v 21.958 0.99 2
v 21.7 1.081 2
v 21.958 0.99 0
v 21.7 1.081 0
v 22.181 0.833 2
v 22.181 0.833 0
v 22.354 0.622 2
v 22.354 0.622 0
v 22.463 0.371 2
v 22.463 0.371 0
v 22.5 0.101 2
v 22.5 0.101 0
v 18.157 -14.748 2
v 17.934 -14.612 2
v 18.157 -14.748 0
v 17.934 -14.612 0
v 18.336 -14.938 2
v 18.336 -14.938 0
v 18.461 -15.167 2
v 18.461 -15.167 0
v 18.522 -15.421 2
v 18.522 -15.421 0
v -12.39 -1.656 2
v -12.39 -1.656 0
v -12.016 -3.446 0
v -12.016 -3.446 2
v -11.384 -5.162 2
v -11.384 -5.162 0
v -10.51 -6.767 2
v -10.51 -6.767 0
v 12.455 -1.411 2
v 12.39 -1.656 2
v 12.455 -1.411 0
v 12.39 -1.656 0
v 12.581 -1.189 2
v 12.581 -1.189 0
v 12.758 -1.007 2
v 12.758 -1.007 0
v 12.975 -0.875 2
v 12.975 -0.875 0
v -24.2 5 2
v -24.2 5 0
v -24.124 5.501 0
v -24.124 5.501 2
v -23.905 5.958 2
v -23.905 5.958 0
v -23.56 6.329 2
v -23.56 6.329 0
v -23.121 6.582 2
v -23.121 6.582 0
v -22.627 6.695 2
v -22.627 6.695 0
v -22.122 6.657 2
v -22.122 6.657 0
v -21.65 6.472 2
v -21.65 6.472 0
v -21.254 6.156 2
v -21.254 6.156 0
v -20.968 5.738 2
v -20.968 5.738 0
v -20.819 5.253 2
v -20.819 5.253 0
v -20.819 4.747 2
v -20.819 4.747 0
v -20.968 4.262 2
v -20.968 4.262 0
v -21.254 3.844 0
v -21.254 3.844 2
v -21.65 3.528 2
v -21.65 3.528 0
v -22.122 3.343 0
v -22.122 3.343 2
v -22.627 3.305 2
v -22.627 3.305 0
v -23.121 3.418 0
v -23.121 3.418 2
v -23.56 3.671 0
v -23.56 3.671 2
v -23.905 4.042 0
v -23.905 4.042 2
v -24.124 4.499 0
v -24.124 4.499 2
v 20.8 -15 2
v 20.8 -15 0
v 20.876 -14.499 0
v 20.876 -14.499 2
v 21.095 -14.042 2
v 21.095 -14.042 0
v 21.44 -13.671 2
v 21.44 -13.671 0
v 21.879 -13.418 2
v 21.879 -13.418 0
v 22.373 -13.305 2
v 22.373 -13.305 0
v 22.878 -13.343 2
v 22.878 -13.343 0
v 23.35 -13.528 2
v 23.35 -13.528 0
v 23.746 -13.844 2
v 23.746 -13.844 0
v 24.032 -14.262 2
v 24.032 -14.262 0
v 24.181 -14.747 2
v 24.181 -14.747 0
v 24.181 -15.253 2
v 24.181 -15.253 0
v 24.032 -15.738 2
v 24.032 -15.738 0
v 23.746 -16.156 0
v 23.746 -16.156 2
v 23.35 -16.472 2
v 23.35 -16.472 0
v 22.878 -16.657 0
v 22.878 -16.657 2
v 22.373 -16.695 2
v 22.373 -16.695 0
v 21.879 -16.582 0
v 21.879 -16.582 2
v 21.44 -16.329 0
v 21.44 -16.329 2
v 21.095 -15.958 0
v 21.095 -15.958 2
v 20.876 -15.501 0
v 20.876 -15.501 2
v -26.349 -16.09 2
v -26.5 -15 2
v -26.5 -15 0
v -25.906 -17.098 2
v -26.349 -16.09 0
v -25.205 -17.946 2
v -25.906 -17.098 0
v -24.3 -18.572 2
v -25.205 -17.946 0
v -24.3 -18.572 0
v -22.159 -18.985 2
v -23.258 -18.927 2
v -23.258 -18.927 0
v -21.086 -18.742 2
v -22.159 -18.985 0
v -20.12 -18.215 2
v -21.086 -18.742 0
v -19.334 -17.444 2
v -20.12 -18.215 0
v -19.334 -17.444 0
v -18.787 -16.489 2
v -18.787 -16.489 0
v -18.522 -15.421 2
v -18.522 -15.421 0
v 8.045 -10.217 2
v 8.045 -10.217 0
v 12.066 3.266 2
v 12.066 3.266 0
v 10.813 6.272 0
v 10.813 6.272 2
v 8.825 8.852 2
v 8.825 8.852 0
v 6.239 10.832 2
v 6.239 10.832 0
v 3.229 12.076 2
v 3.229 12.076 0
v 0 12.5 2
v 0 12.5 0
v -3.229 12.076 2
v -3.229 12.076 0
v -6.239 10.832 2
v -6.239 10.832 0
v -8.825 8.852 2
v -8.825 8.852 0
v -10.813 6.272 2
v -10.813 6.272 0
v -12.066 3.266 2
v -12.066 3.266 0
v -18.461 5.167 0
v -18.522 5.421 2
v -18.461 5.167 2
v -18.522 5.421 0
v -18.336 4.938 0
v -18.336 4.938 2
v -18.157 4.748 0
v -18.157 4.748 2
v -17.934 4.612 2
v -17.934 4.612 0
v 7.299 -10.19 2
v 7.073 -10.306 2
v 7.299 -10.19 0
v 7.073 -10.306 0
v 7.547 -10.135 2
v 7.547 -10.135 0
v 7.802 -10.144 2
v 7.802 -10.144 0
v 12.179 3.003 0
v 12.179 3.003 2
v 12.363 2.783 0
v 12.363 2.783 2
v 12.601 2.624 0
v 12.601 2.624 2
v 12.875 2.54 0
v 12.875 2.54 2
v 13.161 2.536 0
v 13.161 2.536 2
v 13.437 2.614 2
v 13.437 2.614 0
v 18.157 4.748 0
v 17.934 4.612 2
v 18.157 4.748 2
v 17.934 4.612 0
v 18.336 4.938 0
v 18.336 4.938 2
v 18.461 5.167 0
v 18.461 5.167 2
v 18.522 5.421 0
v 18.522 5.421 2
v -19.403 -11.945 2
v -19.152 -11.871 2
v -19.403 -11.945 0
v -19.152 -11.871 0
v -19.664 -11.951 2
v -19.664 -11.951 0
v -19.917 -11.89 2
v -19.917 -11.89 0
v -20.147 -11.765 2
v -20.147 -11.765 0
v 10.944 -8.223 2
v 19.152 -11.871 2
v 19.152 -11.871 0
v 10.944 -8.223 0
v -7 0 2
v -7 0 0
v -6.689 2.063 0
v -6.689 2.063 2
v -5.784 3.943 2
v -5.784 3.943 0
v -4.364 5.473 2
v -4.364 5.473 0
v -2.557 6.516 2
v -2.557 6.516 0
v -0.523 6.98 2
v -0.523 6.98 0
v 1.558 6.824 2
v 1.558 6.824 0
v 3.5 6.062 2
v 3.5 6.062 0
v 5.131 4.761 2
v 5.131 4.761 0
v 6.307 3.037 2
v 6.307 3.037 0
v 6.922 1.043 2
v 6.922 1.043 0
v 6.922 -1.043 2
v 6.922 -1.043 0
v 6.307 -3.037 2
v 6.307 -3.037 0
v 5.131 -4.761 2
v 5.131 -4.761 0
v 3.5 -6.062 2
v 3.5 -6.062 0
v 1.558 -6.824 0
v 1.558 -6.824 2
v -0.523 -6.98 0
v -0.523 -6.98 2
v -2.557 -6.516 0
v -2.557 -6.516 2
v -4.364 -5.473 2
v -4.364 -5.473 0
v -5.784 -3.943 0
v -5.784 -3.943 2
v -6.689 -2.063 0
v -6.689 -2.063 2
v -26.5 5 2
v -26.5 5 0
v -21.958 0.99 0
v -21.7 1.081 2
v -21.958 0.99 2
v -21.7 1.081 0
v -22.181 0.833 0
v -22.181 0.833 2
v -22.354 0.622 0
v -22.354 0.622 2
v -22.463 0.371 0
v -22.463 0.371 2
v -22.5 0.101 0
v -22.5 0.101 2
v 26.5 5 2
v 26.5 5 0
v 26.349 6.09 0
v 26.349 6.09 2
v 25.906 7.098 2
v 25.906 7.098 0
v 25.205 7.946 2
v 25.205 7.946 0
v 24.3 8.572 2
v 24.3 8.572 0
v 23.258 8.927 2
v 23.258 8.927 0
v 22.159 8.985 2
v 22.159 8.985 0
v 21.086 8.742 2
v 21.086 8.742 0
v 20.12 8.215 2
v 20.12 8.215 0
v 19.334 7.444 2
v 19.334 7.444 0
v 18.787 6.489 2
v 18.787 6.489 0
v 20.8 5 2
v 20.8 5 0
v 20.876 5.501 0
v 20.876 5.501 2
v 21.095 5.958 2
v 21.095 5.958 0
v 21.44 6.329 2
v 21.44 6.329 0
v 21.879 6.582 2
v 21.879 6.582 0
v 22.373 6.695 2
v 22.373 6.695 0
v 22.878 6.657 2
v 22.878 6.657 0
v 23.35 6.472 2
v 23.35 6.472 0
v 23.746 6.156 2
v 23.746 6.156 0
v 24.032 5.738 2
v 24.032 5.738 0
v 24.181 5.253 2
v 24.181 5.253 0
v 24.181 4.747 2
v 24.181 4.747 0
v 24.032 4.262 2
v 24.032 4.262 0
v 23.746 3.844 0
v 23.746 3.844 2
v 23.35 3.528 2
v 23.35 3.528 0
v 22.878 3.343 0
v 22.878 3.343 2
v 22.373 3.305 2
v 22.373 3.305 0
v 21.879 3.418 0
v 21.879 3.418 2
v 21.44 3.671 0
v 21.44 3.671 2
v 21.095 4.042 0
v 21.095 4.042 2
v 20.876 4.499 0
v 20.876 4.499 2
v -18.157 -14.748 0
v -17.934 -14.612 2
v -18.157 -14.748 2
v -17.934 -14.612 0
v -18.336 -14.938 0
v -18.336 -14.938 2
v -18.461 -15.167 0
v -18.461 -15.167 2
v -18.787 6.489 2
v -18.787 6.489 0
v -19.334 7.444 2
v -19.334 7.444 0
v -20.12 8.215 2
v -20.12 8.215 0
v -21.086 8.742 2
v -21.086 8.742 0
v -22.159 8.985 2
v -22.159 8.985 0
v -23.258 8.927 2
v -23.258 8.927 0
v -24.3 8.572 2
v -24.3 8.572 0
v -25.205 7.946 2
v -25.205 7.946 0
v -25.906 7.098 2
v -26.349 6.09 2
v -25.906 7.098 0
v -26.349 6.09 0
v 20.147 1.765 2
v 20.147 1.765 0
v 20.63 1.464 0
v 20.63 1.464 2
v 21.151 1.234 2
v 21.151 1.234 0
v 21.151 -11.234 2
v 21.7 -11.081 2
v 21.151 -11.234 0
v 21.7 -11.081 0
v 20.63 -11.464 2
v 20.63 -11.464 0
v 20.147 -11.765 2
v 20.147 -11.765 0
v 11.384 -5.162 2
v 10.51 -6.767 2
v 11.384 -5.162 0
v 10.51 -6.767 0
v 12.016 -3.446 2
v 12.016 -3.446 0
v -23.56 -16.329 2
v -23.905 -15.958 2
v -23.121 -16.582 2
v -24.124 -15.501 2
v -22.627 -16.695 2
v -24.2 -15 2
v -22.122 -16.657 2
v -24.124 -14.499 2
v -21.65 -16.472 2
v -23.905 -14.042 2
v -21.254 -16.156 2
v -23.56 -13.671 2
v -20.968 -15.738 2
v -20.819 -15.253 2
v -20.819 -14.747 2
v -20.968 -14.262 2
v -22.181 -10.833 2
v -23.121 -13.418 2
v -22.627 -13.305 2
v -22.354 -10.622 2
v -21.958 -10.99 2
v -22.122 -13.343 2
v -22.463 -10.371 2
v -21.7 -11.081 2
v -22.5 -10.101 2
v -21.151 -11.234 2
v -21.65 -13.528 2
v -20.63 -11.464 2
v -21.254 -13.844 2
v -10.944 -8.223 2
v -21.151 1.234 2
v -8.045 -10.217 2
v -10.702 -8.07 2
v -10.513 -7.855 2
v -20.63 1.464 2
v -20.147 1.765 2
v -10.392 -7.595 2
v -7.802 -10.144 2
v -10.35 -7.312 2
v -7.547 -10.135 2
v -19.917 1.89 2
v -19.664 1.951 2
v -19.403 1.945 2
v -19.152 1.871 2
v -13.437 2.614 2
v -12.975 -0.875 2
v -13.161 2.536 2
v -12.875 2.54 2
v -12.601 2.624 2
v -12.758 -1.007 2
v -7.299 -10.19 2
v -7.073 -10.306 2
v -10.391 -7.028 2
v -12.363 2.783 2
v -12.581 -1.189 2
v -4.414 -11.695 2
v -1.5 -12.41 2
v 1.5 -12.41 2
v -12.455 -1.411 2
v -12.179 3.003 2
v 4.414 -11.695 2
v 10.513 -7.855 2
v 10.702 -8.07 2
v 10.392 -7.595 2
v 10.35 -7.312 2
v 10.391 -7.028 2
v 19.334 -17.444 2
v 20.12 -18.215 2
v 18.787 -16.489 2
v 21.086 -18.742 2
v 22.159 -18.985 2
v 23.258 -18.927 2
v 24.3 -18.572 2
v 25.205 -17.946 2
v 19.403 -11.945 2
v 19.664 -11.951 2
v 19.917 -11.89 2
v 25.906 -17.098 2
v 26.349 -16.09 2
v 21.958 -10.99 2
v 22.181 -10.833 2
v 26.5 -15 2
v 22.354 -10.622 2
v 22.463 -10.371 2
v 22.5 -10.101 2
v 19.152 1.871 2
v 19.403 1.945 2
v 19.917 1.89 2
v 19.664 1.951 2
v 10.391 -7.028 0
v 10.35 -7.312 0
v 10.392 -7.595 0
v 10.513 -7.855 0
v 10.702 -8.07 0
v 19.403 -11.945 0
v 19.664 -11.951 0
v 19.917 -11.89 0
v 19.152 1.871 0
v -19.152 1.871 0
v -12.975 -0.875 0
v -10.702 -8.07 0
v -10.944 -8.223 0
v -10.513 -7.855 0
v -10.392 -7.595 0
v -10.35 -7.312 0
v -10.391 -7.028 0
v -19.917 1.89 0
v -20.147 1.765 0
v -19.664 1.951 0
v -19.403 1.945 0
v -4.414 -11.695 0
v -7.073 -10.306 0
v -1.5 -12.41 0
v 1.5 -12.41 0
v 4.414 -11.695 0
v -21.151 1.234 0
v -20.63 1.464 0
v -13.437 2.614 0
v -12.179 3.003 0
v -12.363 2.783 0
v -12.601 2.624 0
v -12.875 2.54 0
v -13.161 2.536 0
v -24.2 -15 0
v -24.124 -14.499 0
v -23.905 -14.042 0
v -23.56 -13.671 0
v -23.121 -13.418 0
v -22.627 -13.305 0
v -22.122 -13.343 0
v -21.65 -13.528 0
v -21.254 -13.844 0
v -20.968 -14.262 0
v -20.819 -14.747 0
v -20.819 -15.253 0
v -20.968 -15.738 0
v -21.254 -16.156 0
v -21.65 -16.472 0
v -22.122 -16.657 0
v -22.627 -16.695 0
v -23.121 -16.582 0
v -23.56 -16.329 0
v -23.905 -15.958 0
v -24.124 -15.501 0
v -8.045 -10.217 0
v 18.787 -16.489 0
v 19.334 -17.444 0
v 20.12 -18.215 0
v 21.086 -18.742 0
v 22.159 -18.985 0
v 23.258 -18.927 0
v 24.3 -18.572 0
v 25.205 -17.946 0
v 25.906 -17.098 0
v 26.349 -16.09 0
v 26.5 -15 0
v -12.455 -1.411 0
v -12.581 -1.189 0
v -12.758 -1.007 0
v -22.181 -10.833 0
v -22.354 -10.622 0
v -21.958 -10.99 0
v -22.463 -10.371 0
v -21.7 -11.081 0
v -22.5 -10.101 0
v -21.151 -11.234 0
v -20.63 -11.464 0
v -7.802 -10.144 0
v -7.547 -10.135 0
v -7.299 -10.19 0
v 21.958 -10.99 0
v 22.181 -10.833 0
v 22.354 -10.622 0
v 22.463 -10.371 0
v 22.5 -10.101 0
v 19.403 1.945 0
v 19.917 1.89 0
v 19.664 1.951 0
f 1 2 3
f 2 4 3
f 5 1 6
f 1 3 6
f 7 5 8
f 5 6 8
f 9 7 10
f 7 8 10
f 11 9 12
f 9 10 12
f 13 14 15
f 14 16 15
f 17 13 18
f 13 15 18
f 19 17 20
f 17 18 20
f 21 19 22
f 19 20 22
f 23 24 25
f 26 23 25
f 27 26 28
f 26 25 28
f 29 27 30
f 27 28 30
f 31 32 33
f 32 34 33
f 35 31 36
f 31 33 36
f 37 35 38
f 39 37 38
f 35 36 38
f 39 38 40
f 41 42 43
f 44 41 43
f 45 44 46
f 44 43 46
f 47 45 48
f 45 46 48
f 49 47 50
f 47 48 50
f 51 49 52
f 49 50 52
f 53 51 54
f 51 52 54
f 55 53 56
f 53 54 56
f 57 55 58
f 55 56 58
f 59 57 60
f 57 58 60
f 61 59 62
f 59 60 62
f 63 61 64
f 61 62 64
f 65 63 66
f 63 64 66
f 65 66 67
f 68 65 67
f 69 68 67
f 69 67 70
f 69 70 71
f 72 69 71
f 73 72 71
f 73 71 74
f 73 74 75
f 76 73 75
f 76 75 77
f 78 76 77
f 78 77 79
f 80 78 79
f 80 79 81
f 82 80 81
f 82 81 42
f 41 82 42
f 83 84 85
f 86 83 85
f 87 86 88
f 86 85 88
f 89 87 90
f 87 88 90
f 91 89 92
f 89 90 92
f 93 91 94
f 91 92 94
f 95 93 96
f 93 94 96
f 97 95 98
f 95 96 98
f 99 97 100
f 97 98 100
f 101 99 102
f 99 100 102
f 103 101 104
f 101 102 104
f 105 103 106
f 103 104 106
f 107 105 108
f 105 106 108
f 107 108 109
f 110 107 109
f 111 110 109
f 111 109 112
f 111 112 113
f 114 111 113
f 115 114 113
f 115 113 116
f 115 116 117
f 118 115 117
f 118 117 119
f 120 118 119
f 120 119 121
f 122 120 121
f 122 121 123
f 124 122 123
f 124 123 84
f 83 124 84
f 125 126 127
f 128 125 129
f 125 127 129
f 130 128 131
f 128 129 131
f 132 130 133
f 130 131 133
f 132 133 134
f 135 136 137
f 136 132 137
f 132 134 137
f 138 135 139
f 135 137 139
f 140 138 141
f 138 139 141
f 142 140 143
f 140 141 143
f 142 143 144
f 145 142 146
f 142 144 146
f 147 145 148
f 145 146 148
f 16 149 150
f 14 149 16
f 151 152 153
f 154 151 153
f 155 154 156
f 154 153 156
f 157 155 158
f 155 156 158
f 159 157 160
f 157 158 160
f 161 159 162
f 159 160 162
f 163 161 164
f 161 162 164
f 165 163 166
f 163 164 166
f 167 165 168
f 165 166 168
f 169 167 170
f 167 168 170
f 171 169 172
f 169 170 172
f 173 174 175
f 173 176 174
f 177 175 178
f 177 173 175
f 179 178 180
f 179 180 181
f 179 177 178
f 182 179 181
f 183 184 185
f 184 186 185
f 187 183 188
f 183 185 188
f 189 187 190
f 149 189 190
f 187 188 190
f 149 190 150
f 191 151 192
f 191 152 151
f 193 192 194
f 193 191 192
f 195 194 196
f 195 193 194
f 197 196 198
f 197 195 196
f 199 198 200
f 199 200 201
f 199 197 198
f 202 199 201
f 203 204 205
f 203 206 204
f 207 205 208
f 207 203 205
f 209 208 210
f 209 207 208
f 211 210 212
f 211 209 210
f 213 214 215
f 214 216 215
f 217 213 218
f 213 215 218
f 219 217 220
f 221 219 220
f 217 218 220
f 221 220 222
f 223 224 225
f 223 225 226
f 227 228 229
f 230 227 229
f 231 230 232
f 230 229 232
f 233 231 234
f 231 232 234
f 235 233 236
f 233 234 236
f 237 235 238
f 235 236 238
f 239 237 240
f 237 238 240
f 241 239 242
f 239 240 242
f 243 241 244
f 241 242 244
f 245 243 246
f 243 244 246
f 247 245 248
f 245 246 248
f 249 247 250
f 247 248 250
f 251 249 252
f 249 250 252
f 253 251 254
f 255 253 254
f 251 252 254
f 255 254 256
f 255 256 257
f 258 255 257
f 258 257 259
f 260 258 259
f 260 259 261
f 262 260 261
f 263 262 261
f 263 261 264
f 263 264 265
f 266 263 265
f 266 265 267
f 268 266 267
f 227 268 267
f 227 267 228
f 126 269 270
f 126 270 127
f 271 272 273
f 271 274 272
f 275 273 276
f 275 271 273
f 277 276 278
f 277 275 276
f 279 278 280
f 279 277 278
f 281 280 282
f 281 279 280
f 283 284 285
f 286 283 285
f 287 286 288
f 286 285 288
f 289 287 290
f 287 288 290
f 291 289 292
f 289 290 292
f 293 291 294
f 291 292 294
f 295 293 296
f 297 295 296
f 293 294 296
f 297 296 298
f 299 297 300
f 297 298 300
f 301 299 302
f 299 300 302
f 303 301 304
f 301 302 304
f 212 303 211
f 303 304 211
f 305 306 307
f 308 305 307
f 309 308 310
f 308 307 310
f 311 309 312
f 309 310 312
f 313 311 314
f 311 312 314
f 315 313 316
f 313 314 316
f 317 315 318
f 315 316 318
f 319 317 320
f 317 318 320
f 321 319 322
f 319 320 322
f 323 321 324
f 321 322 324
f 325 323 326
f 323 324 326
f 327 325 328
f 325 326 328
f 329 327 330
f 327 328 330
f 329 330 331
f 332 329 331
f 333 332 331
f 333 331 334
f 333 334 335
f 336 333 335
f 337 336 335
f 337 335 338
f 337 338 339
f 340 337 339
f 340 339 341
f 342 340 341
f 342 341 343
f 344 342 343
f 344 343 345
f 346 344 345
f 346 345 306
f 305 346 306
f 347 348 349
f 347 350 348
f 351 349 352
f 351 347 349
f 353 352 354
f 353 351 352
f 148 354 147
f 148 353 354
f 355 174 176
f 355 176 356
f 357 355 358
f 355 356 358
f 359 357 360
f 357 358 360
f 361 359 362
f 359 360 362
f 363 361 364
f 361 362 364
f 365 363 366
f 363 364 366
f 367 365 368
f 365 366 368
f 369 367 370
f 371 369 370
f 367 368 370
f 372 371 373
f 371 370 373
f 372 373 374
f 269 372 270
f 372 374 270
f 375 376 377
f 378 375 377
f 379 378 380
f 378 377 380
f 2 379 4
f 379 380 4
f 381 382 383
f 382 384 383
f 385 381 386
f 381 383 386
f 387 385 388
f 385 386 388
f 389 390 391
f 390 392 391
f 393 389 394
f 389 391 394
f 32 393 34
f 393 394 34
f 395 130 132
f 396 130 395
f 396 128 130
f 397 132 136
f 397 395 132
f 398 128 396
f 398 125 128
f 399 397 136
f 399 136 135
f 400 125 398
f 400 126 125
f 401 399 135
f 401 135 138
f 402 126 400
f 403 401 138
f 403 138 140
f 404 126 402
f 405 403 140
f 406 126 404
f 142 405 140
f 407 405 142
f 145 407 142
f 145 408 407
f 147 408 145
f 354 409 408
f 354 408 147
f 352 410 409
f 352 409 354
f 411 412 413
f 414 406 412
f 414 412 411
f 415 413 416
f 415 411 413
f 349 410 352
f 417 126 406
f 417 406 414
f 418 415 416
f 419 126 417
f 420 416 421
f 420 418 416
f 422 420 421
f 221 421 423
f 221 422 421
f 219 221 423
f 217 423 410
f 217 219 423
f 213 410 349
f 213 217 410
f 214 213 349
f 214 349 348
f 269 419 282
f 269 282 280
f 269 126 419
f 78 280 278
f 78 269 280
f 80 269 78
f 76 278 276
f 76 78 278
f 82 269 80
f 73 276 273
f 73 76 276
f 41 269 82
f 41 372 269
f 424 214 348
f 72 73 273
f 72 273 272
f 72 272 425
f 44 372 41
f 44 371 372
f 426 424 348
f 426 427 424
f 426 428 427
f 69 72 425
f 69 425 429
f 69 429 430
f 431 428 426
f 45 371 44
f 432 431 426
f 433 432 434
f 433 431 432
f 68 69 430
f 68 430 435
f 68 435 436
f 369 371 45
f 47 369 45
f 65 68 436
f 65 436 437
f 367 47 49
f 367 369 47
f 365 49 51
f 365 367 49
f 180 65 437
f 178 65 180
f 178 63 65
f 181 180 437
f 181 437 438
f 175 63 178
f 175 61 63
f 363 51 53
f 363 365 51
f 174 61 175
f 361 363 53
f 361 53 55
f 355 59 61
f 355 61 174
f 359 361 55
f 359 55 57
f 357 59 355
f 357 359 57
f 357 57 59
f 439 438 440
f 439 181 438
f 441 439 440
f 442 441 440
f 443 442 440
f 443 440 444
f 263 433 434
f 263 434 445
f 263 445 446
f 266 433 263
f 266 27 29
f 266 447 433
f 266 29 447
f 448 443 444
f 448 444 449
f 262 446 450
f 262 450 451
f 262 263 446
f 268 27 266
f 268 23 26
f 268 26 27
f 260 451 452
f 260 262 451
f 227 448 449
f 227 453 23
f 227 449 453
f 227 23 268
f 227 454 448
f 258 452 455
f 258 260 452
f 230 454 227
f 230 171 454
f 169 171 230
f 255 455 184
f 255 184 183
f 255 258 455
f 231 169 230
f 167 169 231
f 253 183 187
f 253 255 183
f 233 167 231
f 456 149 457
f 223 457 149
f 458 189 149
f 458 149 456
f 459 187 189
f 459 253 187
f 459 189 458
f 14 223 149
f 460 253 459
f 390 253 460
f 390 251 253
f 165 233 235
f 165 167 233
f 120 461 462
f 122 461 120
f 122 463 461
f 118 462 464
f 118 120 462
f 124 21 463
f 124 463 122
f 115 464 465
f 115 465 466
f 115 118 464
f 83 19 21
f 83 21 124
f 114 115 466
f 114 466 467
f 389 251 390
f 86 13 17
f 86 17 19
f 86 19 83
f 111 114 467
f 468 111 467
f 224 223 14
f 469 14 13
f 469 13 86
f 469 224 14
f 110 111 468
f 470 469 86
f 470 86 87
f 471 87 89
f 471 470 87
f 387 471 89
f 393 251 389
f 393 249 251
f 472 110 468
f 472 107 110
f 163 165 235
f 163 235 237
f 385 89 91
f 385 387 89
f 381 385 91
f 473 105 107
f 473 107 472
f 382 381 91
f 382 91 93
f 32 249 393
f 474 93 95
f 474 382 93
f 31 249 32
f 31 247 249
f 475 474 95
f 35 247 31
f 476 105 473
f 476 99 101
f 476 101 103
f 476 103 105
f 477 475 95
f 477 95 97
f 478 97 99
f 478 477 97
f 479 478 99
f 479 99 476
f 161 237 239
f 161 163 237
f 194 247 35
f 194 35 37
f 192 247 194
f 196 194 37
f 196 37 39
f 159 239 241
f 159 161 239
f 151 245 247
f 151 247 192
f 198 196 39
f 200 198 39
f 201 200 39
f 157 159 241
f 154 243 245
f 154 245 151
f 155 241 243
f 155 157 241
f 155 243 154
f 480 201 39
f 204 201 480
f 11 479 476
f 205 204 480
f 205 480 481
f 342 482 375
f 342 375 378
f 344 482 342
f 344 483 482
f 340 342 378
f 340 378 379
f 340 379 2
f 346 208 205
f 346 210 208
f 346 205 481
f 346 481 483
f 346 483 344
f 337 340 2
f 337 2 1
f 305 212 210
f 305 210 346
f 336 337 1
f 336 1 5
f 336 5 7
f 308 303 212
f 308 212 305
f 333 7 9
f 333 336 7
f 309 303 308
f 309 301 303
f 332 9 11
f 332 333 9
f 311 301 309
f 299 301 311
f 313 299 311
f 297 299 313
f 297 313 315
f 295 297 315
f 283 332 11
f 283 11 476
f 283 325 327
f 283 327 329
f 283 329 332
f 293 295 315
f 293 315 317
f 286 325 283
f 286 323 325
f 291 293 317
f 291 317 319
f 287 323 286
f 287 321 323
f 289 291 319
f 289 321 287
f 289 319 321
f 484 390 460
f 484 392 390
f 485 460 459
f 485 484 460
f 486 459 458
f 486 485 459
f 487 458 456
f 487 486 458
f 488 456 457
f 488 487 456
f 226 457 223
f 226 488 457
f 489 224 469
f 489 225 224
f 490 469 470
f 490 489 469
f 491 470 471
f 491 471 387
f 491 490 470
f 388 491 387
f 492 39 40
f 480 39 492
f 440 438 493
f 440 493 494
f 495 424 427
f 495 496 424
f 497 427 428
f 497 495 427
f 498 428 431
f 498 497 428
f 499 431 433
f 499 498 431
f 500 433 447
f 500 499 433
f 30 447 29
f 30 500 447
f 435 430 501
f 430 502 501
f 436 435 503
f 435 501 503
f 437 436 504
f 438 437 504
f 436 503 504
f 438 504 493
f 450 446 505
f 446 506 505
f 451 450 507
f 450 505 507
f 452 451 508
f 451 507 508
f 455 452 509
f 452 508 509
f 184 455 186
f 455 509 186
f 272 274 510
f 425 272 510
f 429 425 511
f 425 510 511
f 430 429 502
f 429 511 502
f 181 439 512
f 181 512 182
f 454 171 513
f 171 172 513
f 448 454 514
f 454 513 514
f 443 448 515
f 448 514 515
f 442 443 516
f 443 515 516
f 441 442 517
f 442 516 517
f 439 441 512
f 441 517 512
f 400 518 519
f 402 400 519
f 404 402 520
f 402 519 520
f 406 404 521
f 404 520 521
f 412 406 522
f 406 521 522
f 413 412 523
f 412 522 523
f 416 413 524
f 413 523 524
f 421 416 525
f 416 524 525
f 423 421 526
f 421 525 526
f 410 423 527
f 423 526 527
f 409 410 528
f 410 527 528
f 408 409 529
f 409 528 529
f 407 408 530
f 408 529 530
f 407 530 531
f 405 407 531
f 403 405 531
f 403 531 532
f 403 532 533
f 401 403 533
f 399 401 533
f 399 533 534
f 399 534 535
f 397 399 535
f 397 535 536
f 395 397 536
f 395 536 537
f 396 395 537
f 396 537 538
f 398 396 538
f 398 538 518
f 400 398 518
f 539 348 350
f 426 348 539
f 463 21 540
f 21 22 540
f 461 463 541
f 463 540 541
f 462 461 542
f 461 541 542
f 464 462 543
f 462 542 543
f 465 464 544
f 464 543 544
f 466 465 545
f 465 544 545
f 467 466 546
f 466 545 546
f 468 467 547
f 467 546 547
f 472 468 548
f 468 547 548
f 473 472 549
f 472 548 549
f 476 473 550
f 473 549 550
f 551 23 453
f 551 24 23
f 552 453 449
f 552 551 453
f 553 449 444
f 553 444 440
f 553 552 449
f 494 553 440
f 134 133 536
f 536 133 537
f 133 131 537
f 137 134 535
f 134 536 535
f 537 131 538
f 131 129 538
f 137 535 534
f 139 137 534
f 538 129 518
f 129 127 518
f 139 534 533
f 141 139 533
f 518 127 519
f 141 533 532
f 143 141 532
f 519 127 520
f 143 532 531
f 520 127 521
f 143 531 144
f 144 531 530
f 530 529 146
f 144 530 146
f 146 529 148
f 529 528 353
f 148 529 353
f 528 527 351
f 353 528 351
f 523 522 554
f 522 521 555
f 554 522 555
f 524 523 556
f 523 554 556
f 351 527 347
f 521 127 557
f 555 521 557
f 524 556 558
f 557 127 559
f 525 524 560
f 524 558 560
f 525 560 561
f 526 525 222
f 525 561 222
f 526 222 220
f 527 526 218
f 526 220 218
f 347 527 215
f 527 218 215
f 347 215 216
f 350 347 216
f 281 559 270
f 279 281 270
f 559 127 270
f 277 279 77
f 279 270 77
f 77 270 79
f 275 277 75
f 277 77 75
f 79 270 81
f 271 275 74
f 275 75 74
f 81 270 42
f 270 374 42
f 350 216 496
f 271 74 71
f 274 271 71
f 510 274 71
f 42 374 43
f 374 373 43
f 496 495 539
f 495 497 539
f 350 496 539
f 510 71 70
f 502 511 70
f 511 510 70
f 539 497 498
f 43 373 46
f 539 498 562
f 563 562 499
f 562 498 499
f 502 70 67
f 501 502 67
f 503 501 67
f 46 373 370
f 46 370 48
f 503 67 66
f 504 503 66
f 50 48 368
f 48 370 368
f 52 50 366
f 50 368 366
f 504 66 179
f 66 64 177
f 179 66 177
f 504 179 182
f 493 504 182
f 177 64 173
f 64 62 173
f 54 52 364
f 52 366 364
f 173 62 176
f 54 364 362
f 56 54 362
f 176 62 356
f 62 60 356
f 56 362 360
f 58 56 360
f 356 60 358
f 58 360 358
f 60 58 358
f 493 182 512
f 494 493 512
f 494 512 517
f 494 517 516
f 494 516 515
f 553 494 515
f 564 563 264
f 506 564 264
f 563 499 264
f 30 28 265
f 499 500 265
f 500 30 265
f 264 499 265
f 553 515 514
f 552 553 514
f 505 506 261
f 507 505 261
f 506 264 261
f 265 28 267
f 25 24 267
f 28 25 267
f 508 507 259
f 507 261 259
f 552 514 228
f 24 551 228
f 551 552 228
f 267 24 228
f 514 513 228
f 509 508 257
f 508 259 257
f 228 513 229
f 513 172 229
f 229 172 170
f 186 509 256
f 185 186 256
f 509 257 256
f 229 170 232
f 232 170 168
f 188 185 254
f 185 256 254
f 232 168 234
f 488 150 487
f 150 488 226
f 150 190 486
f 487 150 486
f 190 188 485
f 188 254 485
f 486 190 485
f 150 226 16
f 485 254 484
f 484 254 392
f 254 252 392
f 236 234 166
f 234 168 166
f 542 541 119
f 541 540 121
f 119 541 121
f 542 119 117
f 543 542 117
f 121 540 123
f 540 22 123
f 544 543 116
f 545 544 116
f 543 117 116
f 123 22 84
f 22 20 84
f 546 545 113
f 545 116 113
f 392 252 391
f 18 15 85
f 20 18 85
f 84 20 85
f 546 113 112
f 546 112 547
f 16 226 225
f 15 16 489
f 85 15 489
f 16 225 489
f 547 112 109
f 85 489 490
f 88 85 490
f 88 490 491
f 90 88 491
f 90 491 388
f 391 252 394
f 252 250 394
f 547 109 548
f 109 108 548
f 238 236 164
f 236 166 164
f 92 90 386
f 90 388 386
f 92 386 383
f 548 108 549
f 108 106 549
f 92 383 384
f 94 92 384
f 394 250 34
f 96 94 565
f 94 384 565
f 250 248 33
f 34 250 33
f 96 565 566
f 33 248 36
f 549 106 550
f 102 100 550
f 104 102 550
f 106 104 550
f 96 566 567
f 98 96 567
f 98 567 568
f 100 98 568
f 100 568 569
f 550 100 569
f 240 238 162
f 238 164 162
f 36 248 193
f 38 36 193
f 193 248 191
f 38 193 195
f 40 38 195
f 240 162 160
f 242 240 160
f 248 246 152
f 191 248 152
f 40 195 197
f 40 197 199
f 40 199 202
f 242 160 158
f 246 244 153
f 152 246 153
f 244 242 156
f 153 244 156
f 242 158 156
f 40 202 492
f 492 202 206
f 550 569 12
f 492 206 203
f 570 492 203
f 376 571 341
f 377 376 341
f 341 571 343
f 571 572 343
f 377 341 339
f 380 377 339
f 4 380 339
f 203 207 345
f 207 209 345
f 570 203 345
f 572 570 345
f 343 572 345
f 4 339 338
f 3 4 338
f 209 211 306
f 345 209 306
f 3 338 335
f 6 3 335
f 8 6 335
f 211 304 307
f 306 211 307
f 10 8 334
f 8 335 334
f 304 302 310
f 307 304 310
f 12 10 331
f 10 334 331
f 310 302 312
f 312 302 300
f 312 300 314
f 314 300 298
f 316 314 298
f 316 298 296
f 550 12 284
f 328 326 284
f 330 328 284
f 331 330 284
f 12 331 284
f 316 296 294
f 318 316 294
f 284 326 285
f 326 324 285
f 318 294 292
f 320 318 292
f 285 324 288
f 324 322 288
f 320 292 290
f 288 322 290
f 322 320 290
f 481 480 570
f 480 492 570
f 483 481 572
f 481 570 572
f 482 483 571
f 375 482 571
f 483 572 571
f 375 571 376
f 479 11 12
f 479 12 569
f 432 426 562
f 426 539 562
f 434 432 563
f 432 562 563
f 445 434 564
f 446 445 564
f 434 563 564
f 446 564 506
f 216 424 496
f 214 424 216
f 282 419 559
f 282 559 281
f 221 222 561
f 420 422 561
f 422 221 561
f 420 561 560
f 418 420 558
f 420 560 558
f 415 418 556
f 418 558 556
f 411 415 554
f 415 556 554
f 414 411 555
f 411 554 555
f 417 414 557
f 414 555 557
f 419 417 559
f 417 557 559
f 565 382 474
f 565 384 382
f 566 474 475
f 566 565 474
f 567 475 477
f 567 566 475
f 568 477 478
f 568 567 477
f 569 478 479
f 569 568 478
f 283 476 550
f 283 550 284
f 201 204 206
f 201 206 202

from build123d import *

# Parameters (mm, degrees)
SKETCH_1_R          = 12.5
EXTRUDE_1_DEPTH     = 2
SKETCH_1_R_2        = 4
EXTRUDE_1_2_DEPTH   = 2
EXTRUDE_1_3_DEPTH   = 2
EXTRUDE_1_4_DEPTH   = 2
EXTRUDE_1_5_DEPTH   = 2
EXTRUDE_2_DEPTH     = 2
EXTRUDE_3_DEPTH     = 2
FILLET_1_R          = 1
SKETCH_5_R          = 7
CUT_EXTRUDE_1_DEPTH = 33.668792448
HOLE_WIZARD_M3_1_D  = 3.4


with BuildPart() as part:
    # ｽｹｯﾁ1 → ﾎﾞｽ - 押し出し1 (new body)
    with BuildSketch(Plane.XY):
        Circle(SKETCH_1_R)
    extrude(amount=EXTRUDE_1_DEPTH)



with BuildPart() as body_2:
    # ｽｹｯﾁ1 → Extrude 1 2 (new body)
    with BuildSketch(Plane.XY):
        with Locations((-22.5, 5)):
            Circle(SKETCH_1_R_2)
    extrude(amount=EXTRUDE_1_2_DEPTH)



with BuildPart() as body_3:
    # ｽｹｯﾁ1 → Extrude 1 3 (new body)
    with BuildSketch(Plane.XY):
        with Locations((-22.5, -15)):
            Circle(SKETCH_1_R_2)
    extrude(amount=EXTRUDE_1_3_DEPTH)


with BuildPart() as body_4:
    # ｽｹｯﾁ1 → Extrude 1 4 (new body)
    with BuildSketch(Plane.XY):
        with Locations((22.5, -15)):
            Circle(SKETCH_1_R_2)
    extrude(amount=EXTRUDE_1_4_DEPTH)


with BuildPart() as body_5:
    # ｽｹｯﾁ1 → Extrude 1 5 (new body)
    with BuildSketch(Plane.XY):
        with Locations((22.5, 5)):
            Circle(SKETCH_1_R_2)
    extrude(amount=EXTRUDE_1_5_DEPTH)


with BuildPart() as body_2_1:
    add(body_2.part)

    add(body_3.part)  # ﾎﾞｽ - 押し出し2 merges body 3

    add(body_4.part)  # ﾎﾞｽ - 押し出し2 merges body 4

    add(body_5.part)  # ﾎﾞｽ - 押し出し2 merges body 5
    # ｽｹｯﾁ2 → ﾎﾞｽ - 押し出し2 (add)
    with BuildSketch(Plane.XY.offset(2)):
        with BuildLine():
            Line((-26.5, 5), (-26.5, -15))
            ThreePointArc((-26.5, -15), (-25.328427125, -12.171572875), (-22.5, -11))
            Line((-22.5, -11), (-22.5, 1))
            ThreePointArc((-22.5, 1), (-25.328427125, 2.171572875), (-26.5, 5))
        make_face()
        with BuildLine():
            ThreePointArc((22.5, -11), (25.328427125, -12.171572875), (26.5, -15))
            Line((26.5, -15), (26.5, 5))
            ThreePointArc((26.5, 5), (25.328427125, 2.171572875), (22.5, 1))
            Line((22.5, 1), (22.5, -11))
        make_face()
    extrude(amount=-EXTRUDE_2_DEPTH)


with BuildPart() as part_1:
    add(part.part)

    add(body_2_1.part)  # ﾎﾞｽ - 押し出し3 merges body 2
    # ｽｹｯﾁ3 → ﾎﾞｽ - 押し出し3 (add, through all)
    with BuildSketch(Plane.XY.offset(2)):
        with BuildLine():
            ThreePointArc((-7.521060552, -9.984169879), (-8.74698669, -8.929738174), (-9.82653887, -7.725874309))
            Line((-9.82653887, -7.725874309), (-23.109207699, -13.629282677))
            ThreePointArc((-23.109207699, -13.629282677), (-23.870717323, -15.609207699), (-21.890792301, -16.370717323))
            Line((-21.890792301, -16.370717323), (-7.521060552, -9.984169879))
        make_face()
        with BuildLine():
            Line((23.109207699, -13.629282677), (9.82653887, -7.725874309))
            ThreePointArc((9.82653887, -7.725874309), (8.74698669, -8.929738174), (7.521060552, -9.984169879))
            Line((7.521060552, -9.984169879), (21.890792301, -16.370717323))
            ThreePointArc((21.890792301, -16.370717323), (23.870717323, -15.609207699), (23.109207699, -13.629282677))
        make_face()
        with BuildLine():
            Line((-12.319463678, 2.116793491), (-21.890792301, 6.370717323))
            ThreePointArc((-21.890792301, 6.370717323), (-23.870717323, 5.609207699), (-23.109207699, 3.629282677))
            Line((-23.109207699, 3.629282677), (-12.450816156, -1.107780231))
            ThreePointArc((-12.450816156, -1.107780231), (-12.489642096, 0.508763509), (-12.319463678, 2.116793491))
        make_face()
        with BuildLine():
            Line((21.890792301, 6.370717323), (12.319463678, 2.116793491))
            ThreePointArc((12.319463678, 2.116793491), (12.454784141, 1.06223915), (12.5, 0))
            ThreePointArc((12.5, 0), (12.487697986, -0.55443577), (12.450816156, -1.107780231))
            Line((12.450816156, -1.107780231), (23.109207699, 3.629282677))
            ThreePointArc((23.109207699, 3.629282677), (23.870717323, 5.609207699), (21.890792301, 6.370717323))
        make_face()
    extrude(amount=-EXTRUDE_3_DEPTH)

    # ﾌｨﾚｯﾄ1
    fillet_1_edges = [part_1.edges().sort_by_distance(p)[0] for p in [
        (12.319463678, 2.116793491, 1),
        (12.450816156, -1.107780231, 1),
        (-18.502288389, -14.864715584, 1),
        (-19.720703787, -12.123280938, 1),
        (-22.5, -11, 1),
        (-22.5, 1, 1),
        (7.521060552, -9.984169879, 1),
        (9.82653887, -7.725874309, 1),
        (19.720703787, -12.123280938, 1),
        (18.502288389, -14.864715584, 1),
        (22.5, -11, 1),
        (22.5, 1, 1),
        (-19.720703787, 2.123280938, 1),
        (-18.502288389, 4.864715584, 1),
        (-12.450816156, -1.107780231, 1),
        (-12.319463678, 2.116793491, 1),
        (-9.82653887, -7.725874309, 1),
        (-7.521060552, -9.984169879, 1),
        (18.502288389, 4.864715584, 1),
        (19.720703787, 2.123280938, 1),
    ]]
    fillet(fillet_1_edges, radius=FILLET_1_R)

    # ｽｹｯﾁ5 → ｶｯﾄ - 押し出し1 (cut, through all)
    with BuildSketch(Plane(origin=(0, 0, 0), x_dir=(-1, 0, 0), z_dir=(0, 0, -1))):
        Circle(SKETCH_5_R)
    extrude(amount=-CUT_EXTRUDE_1_DEPTH, mode=Mode.SUBTRACT)

    # M3 すきま穴1 (through all)
    with Locations(Plane.XY.offset(2)):
        with Locations((-22.5, 5), (-22.5, -15), (22.5, -15), (22.5, 5)):
            Hole(HOLE_WIZARD_M3_1_D / 2)


solid = part_1.part
